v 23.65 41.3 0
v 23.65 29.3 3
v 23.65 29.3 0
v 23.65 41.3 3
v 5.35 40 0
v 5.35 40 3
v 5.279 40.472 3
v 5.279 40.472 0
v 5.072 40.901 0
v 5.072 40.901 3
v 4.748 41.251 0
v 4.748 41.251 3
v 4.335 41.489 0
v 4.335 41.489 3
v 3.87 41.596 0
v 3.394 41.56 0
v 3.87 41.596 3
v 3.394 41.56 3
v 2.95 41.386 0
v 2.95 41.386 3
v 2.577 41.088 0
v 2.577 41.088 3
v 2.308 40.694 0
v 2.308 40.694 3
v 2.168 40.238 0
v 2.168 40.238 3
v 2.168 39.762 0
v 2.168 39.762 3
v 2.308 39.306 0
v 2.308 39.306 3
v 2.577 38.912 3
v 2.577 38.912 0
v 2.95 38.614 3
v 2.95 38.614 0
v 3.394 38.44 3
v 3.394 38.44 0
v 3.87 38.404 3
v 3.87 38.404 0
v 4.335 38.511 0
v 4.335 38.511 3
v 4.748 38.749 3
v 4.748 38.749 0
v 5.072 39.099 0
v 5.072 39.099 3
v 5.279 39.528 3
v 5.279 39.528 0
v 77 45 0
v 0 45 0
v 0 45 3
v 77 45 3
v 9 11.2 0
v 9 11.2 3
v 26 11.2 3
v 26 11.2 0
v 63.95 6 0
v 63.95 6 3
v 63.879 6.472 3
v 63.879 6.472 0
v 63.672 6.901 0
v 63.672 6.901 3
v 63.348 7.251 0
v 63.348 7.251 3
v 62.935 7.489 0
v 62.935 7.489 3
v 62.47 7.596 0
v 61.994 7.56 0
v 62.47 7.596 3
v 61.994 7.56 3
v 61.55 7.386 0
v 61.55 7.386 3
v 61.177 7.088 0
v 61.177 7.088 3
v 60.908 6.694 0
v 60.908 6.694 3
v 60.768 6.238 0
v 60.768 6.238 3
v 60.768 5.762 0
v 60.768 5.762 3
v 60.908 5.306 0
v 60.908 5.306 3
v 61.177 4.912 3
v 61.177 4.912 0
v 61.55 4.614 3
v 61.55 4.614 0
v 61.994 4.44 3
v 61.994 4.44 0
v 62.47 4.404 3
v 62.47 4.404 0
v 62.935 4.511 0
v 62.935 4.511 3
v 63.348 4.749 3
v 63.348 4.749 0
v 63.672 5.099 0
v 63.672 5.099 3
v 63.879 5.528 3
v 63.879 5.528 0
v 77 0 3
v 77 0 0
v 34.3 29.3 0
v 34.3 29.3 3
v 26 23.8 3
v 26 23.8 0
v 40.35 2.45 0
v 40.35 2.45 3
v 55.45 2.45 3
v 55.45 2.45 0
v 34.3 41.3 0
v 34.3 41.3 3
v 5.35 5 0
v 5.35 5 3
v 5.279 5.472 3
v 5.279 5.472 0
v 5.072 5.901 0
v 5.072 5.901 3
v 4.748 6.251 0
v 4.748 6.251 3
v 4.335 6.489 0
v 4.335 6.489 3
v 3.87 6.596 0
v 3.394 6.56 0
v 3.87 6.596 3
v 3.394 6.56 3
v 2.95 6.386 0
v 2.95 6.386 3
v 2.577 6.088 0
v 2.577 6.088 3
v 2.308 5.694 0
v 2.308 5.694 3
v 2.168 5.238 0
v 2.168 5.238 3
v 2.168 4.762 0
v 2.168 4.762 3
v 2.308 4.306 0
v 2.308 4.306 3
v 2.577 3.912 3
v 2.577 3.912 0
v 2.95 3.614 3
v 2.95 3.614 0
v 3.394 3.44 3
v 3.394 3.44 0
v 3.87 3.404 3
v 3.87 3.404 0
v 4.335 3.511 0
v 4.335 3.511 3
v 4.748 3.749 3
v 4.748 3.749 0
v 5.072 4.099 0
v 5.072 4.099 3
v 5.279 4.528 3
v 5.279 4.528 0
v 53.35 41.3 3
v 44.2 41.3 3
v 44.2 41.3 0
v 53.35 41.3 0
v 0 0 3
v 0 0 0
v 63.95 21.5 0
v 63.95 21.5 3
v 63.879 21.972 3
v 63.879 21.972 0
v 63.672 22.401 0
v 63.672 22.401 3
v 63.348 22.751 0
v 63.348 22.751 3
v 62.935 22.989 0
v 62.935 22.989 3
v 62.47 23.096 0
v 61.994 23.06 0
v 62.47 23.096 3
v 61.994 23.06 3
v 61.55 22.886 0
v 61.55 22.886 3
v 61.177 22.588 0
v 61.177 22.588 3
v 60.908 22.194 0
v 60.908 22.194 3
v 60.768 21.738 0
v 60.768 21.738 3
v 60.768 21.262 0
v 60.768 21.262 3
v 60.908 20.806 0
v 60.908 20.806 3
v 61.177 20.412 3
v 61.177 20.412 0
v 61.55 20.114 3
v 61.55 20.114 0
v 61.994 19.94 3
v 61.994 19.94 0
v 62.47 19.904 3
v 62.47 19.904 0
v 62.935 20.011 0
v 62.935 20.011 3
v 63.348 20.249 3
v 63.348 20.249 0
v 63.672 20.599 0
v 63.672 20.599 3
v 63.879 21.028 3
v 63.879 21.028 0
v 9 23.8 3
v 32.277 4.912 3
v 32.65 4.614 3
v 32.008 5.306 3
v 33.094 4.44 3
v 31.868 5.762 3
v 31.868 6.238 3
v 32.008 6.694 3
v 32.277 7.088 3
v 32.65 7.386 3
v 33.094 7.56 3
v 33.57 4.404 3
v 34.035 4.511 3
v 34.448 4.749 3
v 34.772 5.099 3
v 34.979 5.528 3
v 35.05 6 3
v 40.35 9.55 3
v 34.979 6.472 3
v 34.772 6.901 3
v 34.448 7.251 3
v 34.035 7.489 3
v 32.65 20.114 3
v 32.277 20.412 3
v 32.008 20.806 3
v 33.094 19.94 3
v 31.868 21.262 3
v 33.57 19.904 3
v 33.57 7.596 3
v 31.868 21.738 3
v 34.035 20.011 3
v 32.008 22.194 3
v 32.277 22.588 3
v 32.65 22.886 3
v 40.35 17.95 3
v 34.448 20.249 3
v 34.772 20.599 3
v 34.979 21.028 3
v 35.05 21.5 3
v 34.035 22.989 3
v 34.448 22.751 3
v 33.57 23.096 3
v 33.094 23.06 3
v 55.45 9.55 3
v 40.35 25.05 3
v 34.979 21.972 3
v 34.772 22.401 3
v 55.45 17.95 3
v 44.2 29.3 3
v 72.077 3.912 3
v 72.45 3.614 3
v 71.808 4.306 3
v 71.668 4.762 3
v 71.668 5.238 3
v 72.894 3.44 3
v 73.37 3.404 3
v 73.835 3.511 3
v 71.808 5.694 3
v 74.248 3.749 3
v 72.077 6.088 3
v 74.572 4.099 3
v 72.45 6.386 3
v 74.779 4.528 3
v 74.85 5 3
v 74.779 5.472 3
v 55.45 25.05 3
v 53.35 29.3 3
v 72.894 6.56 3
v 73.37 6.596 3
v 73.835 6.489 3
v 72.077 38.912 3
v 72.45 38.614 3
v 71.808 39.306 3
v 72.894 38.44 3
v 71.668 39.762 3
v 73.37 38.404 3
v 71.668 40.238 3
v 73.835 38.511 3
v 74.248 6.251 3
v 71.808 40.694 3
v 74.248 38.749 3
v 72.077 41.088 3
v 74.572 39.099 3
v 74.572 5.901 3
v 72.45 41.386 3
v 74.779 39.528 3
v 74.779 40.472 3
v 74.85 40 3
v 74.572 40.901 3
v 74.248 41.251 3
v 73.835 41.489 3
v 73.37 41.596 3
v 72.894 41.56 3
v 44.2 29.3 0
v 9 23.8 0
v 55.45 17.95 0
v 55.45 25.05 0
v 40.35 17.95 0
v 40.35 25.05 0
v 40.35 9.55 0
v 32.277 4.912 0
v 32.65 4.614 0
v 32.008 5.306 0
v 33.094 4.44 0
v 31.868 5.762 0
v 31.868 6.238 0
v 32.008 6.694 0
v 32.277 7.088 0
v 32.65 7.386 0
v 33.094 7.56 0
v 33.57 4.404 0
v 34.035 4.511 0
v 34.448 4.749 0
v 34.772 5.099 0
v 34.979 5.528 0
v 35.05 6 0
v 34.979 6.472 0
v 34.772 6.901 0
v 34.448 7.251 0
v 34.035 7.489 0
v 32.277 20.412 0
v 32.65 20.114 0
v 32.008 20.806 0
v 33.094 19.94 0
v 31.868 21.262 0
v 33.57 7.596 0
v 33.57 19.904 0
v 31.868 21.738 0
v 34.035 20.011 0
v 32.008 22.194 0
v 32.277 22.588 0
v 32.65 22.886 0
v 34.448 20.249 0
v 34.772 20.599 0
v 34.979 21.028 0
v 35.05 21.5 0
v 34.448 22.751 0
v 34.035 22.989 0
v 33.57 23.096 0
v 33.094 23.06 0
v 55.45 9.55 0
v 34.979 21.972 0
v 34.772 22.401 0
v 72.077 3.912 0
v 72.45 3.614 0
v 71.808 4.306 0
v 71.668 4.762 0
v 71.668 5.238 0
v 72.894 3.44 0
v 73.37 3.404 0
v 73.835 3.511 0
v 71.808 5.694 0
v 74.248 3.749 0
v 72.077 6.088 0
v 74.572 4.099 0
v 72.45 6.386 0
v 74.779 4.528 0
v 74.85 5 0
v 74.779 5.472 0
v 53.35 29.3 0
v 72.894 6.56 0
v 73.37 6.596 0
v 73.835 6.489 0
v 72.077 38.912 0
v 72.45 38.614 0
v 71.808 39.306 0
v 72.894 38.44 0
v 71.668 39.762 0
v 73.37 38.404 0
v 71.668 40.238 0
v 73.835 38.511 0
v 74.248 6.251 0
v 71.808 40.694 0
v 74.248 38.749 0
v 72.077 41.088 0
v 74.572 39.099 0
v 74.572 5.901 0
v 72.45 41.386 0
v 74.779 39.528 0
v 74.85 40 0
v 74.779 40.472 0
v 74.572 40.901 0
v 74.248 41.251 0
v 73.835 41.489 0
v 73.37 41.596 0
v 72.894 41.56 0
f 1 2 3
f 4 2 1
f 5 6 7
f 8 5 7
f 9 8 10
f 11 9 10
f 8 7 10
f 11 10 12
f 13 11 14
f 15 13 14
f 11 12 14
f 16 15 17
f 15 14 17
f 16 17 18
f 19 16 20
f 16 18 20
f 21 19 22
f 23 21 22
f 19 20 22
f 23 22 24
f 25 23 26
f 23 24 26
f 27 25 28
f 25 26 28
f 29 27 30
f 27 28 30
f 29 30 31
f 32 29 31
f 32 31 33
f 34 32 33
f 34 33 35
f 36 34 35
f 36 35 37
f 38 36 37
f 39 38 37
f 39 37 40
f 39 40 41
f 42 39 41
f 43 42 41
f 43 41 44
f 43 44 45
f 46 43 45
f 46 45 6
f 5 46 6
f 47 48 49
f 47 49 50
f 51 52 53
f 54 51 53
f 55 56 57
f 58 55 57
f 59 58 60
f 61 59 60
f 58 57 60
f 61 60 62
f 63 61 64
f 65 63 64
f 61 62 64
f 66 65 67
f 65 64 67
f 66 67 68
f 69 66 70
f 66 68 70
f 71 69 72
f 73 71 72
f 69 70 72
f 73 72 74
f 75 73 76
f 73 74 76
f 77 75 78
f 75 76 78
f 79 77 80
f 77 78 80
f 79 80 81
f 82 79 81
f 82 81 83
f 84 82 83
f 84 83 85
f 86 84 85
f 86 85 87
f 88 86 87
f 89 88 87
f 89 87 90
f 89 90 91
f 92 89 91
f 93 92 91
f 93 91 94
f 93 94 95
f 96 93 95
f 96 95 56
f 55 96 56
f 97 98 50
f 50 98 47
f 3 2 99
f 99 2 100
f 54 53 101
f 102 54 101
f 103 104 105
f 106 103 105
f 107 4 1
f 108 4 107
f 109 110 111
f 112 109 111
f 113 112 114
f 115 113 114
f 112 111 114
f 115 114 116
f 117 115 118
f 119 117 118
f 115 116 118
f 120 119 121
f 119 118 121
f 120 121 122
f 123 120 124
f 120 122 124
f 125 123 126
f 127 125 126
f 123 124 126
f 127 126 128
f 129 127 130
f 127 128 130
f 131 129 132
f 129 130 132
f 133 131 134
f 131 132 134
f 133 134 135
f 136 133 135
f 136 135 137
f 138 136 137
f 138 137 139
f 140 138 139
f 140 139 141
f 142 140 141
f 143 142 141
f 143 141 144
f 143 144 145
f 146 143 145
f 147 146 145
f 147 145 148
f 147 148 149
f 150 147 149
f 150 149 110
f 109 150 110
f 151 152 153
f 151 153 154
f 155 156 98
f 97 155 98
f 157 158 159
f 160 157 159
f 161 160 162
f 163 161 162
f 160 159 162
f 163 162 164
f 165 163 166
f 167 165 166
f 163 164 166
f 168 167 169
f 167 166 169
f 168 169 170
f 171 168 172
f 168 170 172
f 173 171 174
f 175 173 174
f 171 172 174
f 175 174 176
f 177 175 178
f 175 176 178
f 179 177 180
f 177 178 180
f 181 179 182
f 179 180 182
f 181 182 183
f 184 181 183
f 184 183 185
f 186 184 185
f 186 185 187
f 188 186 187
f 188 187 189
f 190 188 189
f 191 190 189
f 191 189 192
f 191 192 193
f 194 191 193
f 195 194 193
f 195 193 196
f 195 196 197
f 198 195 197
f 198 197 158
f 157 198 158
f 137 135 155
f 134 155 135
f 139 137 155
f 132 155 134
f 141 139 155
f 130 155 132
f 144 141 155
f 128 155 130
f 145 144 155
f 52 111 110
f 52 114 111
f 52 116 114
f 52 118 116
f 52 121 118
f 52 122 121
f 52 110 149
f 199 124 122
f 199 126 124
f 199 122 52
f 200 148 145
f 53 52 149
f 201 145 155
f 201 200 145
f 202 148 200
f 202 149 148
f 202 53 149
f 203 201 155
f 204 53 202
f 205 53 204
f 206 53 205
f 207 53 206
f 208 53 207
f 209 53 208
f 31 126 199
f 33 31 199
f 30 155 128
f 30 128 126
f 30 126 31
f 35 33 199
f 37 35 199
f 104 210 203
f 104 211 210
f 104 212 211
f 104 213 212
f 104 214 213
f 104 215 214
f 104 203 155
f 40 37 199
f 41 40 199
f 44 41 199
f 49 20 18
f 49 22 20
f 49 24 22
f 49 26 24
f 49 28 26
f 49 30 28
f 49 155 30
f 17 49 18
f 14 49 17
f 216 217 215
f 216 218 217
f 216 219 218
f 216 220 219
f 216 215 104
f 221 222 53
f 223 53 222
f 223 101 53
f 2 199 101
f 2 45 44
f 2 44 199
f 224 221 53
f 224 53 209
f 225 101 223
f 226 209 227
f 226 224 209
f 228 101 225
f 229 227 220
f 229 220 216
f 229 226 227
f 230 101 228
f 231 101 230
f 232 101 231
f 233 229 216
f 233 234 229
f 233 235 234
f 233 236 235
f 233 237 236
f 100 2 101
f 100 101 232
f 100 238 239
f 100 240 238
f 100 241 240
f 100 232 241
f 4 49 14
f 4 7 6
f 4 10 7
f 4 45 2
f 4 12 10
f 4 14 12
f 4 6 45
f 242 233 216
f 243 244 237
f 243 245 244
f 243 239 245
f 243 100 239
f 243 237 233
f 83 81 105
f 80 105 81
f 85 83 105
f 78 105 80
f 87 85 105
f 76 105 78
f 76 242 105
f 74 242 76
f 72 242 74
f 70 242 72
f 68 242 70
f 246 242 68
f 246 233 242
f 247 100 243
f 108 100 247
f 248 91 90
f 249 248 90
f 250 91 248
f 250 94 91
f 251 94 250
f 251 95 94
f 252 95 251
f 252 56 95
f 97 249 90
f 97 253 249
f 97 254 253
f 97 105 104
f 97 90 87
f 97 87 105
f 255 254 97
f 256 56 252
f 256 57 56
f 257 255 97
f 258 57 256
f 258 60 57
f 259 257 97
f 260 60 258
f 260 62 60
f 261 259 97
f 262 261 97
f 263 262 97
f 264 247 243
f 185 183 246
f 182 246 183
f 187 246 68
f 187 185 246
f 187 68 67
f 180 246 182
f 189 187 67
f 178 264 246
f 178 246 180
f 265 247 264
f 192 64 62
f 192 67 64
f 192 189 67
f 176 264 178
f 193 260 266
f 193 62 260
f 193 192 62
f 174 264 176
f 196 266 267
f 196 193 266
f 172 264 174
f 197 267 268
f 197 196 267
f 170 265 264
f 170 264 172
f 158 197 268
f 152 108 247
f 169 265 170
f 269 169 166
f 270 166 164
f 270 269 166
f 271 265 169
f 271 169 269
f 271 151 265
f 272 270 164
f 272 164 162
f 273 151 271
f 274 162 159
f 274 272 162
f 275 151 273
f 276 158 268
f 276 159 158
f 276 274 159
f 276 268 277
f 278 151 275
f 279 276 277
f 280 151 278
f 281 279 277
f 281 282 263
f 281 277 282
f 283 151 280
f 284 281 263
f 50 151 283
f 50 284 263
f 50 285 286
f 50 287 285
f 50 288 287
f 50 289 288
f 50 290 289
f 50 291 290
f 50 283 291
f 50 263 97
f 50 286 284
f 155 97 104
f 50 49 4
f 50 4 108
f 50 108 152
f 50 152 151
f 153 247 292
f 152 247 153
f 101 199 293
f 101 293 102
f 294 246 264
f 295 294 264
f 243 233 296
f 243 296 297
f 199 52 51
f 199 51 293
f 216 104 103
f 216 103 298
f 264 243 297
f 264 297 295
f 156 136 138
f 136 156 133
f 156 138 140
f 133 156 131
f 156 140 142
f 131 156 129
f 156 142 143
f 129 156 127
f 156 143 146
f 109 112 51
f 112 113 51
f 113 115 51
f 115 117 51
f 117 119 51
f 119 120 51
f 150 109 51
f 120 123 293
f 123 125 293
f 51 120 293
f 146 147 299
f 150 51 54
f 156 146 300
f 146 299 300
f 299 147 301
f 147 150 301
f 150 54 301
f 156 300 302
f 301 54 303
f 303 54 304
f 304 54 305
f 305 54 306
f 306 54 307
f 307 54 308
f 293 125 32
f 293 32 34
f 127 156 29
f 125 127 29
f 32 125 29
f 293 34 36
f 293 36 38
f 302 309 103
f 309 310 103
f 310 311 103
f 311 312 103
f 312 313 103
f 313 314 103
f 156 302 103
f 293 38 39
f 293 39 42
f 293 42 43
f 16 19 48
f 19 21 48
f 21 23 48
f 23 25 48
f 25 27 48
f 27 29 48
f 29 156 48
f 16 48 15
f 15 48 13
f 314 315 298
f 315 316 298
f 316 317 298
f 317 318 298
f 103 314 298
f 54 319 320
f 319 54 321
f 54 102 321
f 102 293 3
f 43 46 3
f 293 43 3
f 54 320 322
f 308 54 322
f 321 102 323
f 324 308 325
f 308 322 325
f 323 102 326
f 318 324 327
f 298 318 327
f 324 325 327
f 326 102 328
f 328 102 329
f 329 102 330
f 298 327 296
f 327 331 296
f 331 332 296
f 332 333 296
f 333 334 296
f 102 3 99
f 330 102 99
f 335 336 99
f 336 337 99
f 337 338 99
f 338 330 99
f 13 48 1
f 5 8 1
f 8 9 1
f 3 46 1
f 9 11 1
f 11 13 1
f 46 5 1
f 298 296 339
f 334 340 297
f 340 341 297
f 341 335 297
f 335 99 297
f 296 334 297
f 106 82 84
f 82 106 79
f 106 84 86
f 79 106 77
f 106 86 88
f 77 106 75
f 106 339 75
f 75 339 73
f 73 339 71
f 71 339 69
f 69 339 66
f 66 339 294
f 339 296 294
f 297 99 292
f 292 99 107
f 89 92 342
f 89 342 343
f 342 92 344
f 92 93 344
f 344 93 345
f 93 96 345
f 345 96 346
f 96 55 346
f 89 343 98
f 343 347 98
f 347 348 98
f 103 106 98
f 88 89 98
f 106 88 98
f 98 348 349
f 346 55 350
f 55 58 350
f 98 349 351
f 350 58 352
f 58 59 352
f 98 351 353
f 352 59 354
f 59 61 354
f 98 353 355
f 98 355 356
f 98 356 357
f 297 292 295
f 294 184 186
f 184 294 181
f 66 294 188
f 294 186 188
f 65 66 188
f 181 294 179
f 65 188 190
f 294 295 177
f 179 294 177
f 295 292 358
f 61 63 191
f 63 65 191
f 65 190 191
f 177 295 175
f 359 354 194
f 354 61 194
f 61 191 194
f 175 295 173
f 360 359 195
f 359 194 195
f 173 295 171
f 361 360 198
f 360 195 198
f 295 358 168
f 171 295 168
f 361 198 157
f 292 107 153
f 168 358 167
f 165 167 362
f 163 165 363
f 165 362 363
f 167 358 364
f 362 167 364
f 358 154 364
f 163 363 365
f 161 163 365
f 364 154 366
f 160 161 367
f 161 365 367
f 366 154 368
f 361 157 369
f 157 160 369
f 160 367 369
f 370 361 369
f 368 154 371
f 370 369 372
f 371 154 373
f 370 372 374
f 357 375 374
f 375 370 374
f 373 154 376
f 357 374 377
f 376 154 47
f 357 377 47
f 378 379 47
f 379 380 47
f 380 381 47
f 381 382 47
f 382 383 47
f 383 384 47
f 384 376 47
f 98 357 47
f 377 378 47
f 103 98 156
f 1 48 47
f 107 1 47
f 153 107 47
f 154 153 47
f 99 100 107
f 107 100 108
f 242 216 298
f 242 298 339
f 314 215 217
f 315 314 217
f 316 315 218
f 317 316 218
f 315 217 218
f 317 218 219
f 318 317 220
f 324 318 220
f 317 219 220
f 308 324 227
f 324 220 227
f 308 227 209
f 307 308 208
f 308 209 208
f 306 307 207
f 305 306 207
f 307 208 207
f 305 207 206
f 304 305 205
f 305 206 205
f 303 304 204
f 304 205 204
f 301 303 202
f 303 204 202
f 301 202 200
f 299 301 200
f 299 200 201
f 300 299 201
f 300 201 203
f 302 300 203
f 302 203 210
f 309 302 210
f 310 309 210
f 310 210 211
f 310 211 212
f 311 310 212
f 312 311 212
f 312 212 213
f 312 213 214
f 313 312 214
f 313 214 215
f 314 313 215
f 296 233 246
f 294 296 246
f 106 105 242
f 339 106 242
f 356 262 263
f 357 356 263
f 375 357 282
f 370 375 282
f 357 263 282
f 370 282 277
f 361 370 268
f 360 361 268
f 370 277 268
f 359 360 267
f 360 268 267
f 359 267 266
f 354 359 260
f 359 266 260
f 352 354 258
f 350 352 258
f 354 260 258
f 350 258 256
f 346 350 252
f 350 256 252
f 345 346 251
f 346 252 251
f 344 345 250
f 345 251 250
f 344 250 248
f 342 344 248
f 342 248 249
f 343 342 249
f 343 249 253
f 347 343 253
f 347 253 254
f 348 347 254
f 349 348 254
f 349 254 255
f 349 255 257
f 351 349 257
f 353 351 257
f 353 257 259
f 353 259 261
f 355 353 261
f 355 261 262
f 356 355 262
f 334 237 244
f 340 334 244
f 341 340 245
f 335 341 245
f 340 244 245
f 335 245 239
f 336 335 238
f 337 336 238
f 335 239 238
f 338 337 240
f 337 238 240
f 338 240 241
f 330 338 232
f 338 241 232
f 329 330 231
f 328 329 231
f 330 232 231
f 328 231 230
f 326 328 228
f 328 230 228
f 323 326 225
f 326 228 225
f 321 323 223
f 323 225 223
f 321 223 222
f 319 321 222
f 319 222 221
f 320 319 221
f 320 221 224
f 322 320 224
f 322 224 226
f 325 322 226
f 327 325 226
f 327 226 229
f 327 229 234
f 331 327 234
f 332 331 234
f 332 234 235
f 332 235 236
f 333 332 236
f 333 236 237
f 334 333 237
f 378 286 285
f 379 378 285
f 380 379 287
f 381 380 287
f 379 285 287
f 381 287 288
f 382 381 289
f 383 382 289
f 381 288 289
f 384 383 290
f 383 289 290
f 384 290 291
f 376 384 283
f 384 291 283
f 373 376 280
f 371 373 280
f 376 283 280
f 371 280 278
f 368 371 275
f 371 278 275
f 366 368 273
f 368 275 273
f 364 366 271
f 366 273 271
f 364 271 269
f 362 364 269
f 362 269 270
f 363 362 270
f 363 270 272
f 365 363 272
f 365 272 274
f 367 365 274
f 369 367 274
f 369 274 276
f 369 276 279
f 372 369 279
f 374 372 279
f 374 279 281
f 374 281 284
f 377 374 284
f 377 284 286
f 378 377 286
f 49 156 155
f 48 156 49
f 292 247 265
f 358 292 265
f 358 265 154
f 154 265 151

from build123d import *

# Parameters (mm, degrees)
CROQUIS1_W              = 77
CROQUIS1_H              = 45
SALIENTE_EXTRUIR1_DEPTH = 3
CORTAR_EXTRUIR1_REACH   = 5
CROQUIS2_R              = 1.6
CROQUIS2_W              = 17
CROQUIS2_H              = 12.6
CROQUIS2_W_2            = 10.65
CROQUIS2_H_2            = 12
CROQUIS2_W_3            = 9.15
CROQUIS2_W_4            = 15.1
CROQUIS2_H_3            = 7.1


with BuildPart() as part:
    # Croquis1 → Saliente-Extruir1 (new body)
    with BuildSketch(Plane.XY):
        with Locations((38.5, 22.5)):
            Rectangle(CROQUIS1_W, CROQUIS1_H)
    extrude(amount=SALIENTE_EXTRUIR1_DEPTH)

    # Croquis2 → Cortar-Extruir1 (cut, up to next)
    with BuildSketch(Plane.XY.offset(3), mode=Mode.PRIVATE) as cortar_extruir1_sk1:
        with Locations((3.75, 40)):
            Circle(CROQUIS2_R)
    cortar_extruir1_tool1 = extrude(cortar_extruir1_sk1.sketch, amount=-CORTAR_EXTRUIR1_REACH, mode=Mode.PRIVATE) & part.part
    add(cortar_extruir1_tool1.solids().sort_by_distance((3.75, 40, 3))[0], mode=Mode.SUBTRACT)
    # Croquis2 → Cortar-Extruir1 (cut, up to next)
    with BuildSketch(Plane.XY.offset(3), mode=Mode.PRIVATE) as cortar_extruir1_sk2:
        with Locations((3.75, 5)):
            Circle(CROQUIS2_R)
    cortar_extruir1_tool2 = extrude(cortar_extruir1_sk2.sketch, amount=-CORTAR_EXTRUIR1_REACH, mode=Mode.PRIVATE) & part.part
    add(cortar_extruir1_tool2.solids().sort_by_distance((3.75, 5, 3))[0], mode=Mode.SUBTRACT)
    # Croquis2 → Cortar-Extruir1 (cut, up to next)
    with BuildSketch(Plane.XY.offset(3), mode=Mode.PRIVATE) as cortar_extruir1_sk3:
        with Locations((73.25, 5)):
            Circle(CROQUIS2_R)
    cortar_extruir1_tool3 = extrude(cortar_extruir1_sk3.sketch, amount=-CORTAR_EXTRUIR1_REACH, mode=Mode.PRIVATE) & part.part
    add(cortar_extruir1_tool3.solids().sort_by_distance((73.25, 5, 3))[0], mode=Mode.SUBTRACT)
    # Croquis2 → Cortar-Extruir1 (cut, up to next)
    with BuildSketch(Plane.XY.offset(3), mode=Mode.PRIVATE) as cortar_extruir1_sk4:
        with Locations((73.25, 40)):
            Circle(CROQUIS2_R)
    cortar_extruir1_tool4 = extrude(cortar_extruir1_sk4.sketch, amount=-CORTAR_EXTRUIR1_REACH, mode=Mode.PRIVATE) & part.part
    add(cortar_extruir1_tool4.solids().sort_by_distance((73.25, 40, 3))[0], mode=Mode.SUBTRACT)
    # Croquis2 → Cortar-Extruir1 (cut, up to next)
    with BuildSketch(Plane.XY.offset(3), mode=Mode.PRIVATE) as cortar_extruir1_sk5:
        with Locations((33.45, 21.5)):
            Circle(CROQUIS2_R)
    cortar_extruir1_tool5 = extrude(cortar_extruir1_sk5.sketch, amount=-CORTAR_EXTRUIR1_REACH, mode=Mode.PRIVATE) & part.part
    add(cortar_extruir1_tool5.solids().sort_by_distance((33.45, 21.5, 3))[0], mode=Mode.SUBTRACT)
    # Croquis2 → Cortar-Extruir1 (cut, up to next)
    with BuildSketch(Plane.XY.offset(3), mode=Mode.PRIVATE) as cortar_extruir1_sk6:
        with Locations((33.45, 6)):
            Circle(CROQUIS2_R)
    cortar_extruir1_tool6 = extrude(cortar_extruir1_sk6.sketch, amount=-CORTAR_EXTRUIR1_REACH, mode=Mode.PRIVATE) & part.part
    add(cortar_extruir1_tool6.solids().sort_by_distance((33.45, 6, 3))[0], mode=Mode.SUBTRACT)
    # Croquis2 → Cortar-Extruir1 (cut, up to next)
    with BuildSketch(Plane.XY.offset(3), mode=Mode.PRIVATE) as cortar_extruir1_sk7:
        with Locations((62.35, 21.5)):
            Circle(CROQUIS2_R)
    cortar_extruir1_tool7 = extrude(cortar_extruir1_sk7.sketch, amount=-CORTAR_EXTRUIR1_REACH, mode=Mode.PRIVATE) & part.part
    add(cortar_extruir1_tool7.solids().sort_by_distance((62.35, 21.5, 3))[0], mode=Mode.SUBTRACT)
    # Croquis2 → Cortar-Extruir1 (cut, up to next)
    with BuildSketch(Plane.XY.offset(3), mode=Mode.PRIVATE) as cortar_extruir1_sk8:
        with Locations((62.35, 6)):
            Circle(CROQUIS2_R)
    cortar_extruir1_tool8 = extrude(cortar_extruir1_sk8.sketch, amount=-CORTAR_EXTRUIR1_REACH, mode=Mode.PRIVATE) & part.part
    add(cortar_extruir1_tool8.solids().sort_by_distance((62.35, 6, 3))[0], mode=Mode.SUBTRACT)
    # Croquis2 → Cortar-Extruir1 (cut, up to next)
    with BuildSketch(Plane.XY.offset(3), mode=Mode.PRIVATE) as cortar_extruir1_sk9:
        with Locations((17.5, 17.5)):
            Rectangle(CROQUIS2_W, CROQUIS2_H)
    cortar_extruir1_tool9 = extrude(cortar_extruir1_sk9.sketch, amount=-CORTAR_EXTRUIR1_REACH, mode=Mode.PRIVATE) & part.part
    add(cortar_extruir1_tool9.solids().sort_by_distance((17.5, 17.5, 3))[0], mode=Mode.SUBTRACT)
    # Croquis2 → Cortar-Extruir1 (cut, up to next)
    with BuildSketch(Plane.XY.offset(3), mode=Mode.PRIVATE) as cortar_extruir1_sk10:
        with Locations((28.975, 35.3)):
            Rectangle(CROQUIS2_W_2, CROQUIS2_H_2)
    cortar_extruir1_tool10 = extrude(cortar_extruir1_sk10.sketch, amount=-CORTAR_EXTRUIR1_REACH, mode=Mode.PRIVATE) & part.part
    add(cortar_extruir1_tool10.solids().sort_by_distance((28.975, 35.3, 3))[0], mode=Mode.SUBTRACT)
    # Croquis2 → Cortar-Extruir1 (cut, up to next)
    with BuildSketch(Plane.XY.offset(3), mode=Mode.PRIVATE) as cortar_extruir1_sk11:
        with Locations((48.775, 35.3)):
            Rectangle(CROQUIS2_W_3, CROQUIS2_H_2)
    cortar_extruir1_tool11 = extrude(cortar_extruir1_sk11.sketch, amount=-CORTAR_EXTRUIR1_REACH, mode=Mode.PRIVATE) & part.part
    add(cortar_extruir1_tool11.solids().sort_by_distance((48.775, 35.3, 3))[0], mode=Mode.SUBTRACT)
    # Croquis2 → Cortar-Extruir1 (cut, up to next)
    with BuildSketch(Plane.XY.offset(3), mode=Mode.PRIVATE) as cortar_extruir1_sk12:
        with Locations((47.9, 21.5)):
            Rectangle(CROQUIS2_W_4, CROQUIS2_H_3)
    cortar_extruir1_tool12 = extrude(cortar_extruir1_sk12.sketch, amount=-CORTAR_EXTRUIR1_REACH, mode=Mode.PRIVATE) & part.part
    add(cortar_extruir1_tool12.solids().sort_by_distance((47.9, 21.5, 3))[0], mode=Mode.SUBTRACT)
    # Croquis2 → Cortar-Extruir1 (cut, up to next)
    with BuildSketch(Plane.XY.offset(3), mode=Mode.PRIVATE) as cortar_extruir1_sk13:
        with Locations((47.9, 6)):
            Rectangle(CROQUIS2_W_4, CROQUIS2_H_3)
    cortar_extruir1_tool13 = extrude(cortar_extruir1_sk13.sketch, amount=-CORTAR_EXTRUIR1_REACH, mode=Mode.PRIVATE) & part.part
    add(cortar_extruir1_tool13.solids().sort_by_distance((47.9, 6, 3))[0], mode=Mode.SUBTRACT)


solid = part.part
